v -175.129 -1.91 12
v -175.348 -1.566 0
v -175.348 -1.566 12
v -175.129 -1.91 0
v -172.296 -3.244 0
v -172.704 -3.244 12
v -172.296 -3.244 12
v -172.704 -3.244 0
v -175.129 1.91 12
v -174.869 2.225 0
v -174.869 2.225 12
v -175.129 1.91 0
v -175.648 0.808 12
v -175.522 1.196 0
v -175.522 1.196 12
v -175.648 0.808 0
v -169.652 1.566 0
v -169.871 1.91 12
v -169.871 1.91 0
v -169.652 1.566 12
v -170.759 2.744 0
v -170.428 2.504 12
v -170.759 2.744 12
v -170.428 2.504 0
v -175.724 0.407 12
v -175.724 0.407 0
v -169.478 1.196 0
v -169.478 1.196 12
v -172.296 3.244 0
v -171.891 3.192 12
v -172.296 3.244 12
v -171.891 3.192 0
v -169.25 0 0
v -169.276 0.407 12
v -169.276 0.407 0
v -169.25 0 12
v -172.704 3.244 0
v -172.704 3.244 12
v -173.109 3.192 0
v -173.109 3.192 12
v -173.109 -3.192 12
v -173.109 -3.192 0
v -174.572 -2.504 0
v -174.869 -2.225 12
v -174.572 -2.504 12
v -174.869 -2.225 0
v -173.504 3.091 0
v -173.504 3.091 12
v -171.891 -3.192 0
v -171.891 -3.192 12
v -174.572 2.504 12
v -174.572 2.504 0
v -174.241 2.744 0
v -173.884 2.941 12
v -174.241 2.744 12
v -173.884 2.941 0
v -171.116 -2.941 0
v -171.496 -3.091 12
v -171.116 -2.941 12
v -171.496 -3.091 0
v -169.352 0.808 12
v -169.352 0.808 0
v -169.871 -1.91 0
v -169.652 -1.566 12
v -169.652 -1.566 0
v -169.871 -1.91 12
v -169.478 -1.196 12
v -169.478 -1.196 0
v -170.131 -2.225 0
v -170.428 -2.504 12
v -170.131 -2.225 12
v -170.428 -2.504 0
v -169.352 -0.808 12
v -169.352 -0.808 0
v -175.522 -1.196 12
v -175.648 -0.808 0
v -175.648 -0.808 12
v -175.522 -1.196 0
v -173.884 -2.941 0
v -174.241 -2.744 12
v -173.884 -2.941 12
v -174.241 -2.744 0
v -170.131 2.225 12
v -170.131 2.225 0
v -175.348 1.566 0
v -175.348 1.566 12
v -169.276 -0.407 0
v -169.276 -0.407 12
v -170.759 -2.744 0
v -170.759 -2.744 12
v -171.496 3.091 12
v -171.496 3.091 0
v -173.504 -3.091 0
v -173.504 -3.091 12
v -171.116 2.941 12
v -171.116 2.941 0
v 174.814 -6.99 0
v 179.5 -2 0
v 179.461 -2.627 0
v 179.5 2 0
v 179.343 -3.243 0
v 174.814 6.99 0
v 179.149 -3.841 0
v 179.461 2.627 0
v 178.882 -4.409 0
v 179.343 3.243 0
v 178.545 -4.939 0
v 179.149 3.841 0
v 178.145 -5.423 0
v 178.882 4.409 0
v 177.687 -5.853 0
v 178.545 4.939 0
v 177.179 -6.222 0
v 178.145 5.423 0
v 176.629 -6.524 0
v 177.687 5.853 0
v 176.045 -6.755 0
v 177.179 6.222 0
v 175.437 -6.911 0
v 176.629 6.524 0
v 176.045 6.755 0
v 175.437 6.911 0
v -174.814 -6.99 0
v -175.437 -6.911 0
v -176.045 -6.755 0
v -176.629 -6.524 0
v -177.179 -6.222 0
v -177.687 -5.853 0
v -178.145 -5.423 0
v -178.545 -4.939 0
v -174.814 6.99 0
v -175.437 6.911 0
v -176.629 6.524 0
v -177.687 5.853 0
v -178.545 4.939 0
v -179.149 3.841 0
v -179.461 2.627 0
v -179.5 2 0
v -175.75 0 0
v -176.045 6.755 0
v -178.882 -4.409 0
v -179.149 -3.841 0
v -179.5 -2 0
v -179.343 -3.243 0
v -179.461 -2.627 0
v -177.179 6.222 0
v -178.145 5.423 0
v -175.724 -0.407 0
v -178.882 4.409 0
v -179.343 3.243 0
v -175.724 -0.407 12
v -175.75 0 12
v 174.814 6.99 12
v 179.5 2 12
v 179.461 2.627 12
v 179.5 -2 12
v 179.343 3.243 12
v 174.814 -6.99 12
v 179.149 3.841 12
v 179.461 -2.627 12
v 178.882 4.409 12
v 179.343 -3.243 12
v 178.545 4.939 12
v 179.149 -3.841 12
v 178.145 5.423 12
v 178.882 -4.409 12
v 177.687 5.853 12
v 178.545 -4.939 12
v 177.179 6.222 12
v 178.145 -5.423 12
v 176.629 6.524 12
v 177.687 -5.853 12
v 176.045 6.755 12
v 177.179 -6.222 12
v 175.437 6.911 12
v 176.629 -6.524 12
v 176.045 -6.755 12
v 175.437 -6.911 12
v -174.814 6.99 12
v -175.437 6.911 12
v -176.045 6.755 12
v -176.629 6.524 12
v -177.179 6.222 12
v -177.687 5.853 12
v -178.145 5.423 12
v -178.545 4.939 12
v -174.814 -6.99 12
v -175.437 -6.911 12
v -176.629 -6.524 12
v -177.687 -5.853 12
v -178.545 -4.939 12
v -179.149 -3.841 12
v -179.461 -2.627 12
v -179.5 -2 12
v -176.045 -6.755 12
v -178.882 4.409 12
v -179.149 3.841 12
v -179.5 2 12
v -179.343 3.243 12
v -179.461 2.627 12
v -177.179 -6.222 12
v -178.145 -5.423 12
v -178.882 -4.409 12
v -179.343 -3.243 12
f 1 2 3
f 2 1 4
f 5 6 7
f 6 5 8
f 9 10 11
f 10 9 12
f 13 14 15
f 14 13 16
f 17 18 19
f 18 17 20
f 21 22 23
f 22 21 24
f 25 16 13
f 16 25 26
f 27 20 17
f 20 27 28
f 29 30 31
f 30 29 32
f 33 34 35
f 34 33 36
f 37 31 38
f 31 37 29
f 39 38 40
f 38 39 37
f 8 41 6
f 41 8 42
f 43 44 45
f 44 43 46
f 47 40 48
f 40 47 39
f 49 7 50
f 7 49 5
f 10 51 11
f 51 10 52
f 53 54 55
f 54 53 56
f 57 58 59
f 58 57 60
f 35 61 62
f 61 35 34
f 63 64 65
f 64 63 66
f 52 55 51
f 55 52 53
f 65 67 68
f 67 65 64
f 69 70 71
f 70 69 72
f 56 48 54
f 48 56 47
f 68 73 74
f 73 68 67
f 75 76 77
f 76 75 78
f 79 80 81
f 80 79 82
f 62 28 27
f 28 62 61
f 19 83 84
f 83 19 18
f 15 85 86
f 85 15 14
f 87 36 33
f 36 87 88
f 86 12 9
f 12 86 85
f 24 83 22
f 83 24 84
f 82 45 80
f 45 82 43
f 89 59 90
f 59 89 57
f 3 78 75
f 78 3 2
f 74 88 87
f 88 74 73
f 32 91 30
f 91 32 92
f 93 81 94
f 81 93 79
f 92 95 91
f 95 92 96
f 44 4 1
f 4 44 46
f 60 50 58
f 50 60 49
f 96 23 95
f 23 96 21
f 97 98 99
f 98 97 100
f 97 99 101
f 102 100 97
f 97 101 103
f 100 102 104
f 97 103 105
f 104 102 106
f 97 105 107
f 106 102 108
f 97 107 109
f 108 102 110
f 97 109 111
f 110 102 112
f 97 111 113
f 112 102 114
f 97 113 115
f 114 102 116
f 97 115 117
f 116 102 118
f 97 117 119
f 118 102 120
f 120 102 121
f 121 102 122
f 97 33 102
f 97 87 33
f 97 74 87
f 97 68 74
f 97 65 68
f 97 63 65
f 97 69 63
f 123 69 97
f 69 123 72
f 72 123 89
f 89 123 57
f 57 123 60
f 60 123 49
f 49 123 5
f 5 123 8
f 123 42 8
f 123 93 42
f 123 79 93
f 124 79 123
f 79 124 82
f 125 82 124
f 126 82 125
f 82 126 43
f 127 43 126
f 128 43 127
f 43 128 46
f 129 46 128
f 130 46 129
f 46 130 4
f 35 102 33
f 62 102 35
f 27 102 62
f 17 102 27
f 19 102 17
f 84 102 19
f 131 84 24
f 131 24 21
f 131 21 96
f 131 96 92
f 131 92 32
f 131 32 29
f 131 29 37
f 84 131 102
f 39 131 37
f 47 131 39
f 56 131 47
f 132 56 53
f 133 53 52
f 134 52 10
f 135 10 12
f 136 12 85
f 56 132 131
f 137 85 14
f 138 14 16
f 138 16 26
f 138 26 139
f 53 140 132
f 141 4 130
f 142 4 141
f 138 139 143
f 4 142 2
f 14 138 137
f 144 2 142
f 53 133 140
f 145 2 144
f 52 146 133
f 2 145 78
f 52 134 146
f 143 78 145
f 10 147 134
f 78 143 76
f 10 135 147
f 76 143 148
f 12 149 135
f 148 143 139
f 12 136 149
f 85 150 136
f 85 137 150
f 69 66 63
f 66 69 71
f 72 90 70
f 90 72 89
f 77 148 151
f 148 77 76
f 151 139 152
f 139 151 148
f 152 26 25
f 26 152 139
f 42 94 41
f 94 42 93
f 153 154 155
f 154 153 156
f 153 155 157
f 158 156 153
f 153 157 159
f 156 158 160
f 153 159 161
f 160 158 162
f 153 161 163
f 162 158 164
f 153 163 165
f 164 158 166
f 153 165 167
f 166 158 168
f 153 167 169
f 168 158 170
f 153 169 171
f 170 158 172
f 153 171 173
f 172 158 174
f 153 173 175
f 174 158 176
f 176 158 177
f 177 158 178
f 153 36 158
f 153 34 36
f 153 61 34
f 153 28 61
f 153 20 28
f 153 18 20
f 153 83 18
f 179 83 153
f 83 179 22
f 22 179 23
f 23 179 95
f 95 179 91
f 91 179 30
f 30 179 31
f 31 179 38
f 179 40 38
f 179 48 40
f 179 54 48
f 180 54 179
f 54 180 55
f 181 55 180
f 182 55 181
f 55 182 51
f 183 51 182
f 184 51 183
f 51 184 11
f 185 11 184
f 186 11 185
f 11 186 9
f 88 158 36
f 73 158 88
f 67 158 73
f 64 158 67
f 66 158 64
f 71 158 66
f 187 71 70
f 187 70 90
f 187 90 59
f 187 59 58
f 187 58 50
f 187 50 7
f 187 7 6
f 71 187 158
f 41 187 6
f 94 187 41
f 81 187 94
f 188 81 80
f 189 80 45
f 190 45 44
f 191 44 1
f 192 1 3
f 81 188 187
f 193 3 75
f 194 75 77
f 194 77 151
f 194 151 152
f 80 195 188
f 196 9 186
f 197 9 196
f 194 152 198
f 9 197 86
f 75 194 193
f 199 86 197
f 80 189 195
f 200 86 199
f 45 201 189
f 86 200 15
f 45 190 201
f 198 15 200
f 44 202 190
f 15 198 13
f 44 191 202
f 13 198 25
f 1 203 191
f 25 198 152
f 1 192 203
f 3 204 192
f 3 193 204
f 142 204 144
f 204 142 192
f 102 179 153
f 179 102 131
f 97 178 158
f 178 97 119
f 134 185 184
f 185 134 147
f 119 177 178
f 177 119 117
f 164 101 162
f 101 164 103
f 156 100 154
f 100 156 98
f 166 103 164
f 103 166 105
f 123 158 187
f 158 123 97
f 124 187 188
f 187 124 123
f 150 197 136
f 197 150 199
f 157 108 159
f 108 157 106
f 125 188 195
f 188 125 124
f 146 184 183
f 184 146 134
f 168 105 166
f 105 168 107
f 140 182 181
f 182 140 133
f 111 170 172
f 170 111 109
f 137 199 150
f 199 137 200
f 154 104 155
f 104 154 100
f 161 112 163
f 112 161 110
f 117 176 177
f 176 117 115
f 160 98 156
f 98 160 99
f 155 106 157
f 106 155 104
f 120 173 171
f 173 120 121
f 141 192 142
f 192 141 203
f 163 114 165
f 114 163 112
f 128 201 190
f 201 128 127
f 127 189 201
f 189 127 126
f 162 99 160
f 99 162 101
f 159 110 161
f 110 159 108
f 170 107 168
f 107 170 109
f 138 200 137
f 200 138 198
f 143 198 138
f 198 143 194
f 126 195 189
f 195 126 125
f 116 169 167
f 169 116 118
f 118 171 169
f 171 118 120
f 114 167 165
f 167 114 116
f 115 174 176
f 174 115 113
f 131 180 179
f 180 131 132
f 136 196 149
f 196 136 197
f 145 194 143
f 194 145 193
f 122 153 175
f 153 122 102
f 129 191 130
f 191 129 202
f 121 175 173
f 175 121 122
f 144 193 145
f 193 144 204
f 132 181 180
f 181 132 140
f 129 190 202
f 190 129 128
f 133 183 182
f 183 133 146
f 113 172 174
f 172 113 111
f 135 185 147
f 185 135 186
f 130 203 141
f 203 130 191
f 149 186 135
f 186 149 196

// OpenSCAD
$fn = 50;


difference() {
	union() {
		hull() {
			translate(v = [-174.5000000000, 2.0000000000, 0]) {
				cylinder(h = 12, r = 5);
			}
			translate(v = [174.5000000000, 2.0000000000, 0]) {
				cylinder(h = 12, r = 5);
			}
			translate(v = [-174.5000000000, -2.0000000000, 0]) {
				cylinder(h = 12, r = 5);
			}
			translate(v = [174.5000000000, -2.0000000000, 0]) {
				cylinder(h = 12, r = 5);
			}
		}
	}
	union() {
		translate(v = [-172.5000000000, 0.0000000000, 0]) {
			cylinder(h = 12, r = 3.2500000000);
		}
		translate(v = [-172.5000000000, 0.0000000000, 0]) {
			cylinder(h = 12, r = 1.8000000000);
		}
		translate(v = [-172.5000000000, 0.0000000000, 0]) {
			cylinder(h = 12, r = 1.8000000000);
		}
		translate(v = [-172.5000000000, 0.0000000000, 0]) {
			cylinder(h = 12, r = 1.8000000000);
		}
	}
}
